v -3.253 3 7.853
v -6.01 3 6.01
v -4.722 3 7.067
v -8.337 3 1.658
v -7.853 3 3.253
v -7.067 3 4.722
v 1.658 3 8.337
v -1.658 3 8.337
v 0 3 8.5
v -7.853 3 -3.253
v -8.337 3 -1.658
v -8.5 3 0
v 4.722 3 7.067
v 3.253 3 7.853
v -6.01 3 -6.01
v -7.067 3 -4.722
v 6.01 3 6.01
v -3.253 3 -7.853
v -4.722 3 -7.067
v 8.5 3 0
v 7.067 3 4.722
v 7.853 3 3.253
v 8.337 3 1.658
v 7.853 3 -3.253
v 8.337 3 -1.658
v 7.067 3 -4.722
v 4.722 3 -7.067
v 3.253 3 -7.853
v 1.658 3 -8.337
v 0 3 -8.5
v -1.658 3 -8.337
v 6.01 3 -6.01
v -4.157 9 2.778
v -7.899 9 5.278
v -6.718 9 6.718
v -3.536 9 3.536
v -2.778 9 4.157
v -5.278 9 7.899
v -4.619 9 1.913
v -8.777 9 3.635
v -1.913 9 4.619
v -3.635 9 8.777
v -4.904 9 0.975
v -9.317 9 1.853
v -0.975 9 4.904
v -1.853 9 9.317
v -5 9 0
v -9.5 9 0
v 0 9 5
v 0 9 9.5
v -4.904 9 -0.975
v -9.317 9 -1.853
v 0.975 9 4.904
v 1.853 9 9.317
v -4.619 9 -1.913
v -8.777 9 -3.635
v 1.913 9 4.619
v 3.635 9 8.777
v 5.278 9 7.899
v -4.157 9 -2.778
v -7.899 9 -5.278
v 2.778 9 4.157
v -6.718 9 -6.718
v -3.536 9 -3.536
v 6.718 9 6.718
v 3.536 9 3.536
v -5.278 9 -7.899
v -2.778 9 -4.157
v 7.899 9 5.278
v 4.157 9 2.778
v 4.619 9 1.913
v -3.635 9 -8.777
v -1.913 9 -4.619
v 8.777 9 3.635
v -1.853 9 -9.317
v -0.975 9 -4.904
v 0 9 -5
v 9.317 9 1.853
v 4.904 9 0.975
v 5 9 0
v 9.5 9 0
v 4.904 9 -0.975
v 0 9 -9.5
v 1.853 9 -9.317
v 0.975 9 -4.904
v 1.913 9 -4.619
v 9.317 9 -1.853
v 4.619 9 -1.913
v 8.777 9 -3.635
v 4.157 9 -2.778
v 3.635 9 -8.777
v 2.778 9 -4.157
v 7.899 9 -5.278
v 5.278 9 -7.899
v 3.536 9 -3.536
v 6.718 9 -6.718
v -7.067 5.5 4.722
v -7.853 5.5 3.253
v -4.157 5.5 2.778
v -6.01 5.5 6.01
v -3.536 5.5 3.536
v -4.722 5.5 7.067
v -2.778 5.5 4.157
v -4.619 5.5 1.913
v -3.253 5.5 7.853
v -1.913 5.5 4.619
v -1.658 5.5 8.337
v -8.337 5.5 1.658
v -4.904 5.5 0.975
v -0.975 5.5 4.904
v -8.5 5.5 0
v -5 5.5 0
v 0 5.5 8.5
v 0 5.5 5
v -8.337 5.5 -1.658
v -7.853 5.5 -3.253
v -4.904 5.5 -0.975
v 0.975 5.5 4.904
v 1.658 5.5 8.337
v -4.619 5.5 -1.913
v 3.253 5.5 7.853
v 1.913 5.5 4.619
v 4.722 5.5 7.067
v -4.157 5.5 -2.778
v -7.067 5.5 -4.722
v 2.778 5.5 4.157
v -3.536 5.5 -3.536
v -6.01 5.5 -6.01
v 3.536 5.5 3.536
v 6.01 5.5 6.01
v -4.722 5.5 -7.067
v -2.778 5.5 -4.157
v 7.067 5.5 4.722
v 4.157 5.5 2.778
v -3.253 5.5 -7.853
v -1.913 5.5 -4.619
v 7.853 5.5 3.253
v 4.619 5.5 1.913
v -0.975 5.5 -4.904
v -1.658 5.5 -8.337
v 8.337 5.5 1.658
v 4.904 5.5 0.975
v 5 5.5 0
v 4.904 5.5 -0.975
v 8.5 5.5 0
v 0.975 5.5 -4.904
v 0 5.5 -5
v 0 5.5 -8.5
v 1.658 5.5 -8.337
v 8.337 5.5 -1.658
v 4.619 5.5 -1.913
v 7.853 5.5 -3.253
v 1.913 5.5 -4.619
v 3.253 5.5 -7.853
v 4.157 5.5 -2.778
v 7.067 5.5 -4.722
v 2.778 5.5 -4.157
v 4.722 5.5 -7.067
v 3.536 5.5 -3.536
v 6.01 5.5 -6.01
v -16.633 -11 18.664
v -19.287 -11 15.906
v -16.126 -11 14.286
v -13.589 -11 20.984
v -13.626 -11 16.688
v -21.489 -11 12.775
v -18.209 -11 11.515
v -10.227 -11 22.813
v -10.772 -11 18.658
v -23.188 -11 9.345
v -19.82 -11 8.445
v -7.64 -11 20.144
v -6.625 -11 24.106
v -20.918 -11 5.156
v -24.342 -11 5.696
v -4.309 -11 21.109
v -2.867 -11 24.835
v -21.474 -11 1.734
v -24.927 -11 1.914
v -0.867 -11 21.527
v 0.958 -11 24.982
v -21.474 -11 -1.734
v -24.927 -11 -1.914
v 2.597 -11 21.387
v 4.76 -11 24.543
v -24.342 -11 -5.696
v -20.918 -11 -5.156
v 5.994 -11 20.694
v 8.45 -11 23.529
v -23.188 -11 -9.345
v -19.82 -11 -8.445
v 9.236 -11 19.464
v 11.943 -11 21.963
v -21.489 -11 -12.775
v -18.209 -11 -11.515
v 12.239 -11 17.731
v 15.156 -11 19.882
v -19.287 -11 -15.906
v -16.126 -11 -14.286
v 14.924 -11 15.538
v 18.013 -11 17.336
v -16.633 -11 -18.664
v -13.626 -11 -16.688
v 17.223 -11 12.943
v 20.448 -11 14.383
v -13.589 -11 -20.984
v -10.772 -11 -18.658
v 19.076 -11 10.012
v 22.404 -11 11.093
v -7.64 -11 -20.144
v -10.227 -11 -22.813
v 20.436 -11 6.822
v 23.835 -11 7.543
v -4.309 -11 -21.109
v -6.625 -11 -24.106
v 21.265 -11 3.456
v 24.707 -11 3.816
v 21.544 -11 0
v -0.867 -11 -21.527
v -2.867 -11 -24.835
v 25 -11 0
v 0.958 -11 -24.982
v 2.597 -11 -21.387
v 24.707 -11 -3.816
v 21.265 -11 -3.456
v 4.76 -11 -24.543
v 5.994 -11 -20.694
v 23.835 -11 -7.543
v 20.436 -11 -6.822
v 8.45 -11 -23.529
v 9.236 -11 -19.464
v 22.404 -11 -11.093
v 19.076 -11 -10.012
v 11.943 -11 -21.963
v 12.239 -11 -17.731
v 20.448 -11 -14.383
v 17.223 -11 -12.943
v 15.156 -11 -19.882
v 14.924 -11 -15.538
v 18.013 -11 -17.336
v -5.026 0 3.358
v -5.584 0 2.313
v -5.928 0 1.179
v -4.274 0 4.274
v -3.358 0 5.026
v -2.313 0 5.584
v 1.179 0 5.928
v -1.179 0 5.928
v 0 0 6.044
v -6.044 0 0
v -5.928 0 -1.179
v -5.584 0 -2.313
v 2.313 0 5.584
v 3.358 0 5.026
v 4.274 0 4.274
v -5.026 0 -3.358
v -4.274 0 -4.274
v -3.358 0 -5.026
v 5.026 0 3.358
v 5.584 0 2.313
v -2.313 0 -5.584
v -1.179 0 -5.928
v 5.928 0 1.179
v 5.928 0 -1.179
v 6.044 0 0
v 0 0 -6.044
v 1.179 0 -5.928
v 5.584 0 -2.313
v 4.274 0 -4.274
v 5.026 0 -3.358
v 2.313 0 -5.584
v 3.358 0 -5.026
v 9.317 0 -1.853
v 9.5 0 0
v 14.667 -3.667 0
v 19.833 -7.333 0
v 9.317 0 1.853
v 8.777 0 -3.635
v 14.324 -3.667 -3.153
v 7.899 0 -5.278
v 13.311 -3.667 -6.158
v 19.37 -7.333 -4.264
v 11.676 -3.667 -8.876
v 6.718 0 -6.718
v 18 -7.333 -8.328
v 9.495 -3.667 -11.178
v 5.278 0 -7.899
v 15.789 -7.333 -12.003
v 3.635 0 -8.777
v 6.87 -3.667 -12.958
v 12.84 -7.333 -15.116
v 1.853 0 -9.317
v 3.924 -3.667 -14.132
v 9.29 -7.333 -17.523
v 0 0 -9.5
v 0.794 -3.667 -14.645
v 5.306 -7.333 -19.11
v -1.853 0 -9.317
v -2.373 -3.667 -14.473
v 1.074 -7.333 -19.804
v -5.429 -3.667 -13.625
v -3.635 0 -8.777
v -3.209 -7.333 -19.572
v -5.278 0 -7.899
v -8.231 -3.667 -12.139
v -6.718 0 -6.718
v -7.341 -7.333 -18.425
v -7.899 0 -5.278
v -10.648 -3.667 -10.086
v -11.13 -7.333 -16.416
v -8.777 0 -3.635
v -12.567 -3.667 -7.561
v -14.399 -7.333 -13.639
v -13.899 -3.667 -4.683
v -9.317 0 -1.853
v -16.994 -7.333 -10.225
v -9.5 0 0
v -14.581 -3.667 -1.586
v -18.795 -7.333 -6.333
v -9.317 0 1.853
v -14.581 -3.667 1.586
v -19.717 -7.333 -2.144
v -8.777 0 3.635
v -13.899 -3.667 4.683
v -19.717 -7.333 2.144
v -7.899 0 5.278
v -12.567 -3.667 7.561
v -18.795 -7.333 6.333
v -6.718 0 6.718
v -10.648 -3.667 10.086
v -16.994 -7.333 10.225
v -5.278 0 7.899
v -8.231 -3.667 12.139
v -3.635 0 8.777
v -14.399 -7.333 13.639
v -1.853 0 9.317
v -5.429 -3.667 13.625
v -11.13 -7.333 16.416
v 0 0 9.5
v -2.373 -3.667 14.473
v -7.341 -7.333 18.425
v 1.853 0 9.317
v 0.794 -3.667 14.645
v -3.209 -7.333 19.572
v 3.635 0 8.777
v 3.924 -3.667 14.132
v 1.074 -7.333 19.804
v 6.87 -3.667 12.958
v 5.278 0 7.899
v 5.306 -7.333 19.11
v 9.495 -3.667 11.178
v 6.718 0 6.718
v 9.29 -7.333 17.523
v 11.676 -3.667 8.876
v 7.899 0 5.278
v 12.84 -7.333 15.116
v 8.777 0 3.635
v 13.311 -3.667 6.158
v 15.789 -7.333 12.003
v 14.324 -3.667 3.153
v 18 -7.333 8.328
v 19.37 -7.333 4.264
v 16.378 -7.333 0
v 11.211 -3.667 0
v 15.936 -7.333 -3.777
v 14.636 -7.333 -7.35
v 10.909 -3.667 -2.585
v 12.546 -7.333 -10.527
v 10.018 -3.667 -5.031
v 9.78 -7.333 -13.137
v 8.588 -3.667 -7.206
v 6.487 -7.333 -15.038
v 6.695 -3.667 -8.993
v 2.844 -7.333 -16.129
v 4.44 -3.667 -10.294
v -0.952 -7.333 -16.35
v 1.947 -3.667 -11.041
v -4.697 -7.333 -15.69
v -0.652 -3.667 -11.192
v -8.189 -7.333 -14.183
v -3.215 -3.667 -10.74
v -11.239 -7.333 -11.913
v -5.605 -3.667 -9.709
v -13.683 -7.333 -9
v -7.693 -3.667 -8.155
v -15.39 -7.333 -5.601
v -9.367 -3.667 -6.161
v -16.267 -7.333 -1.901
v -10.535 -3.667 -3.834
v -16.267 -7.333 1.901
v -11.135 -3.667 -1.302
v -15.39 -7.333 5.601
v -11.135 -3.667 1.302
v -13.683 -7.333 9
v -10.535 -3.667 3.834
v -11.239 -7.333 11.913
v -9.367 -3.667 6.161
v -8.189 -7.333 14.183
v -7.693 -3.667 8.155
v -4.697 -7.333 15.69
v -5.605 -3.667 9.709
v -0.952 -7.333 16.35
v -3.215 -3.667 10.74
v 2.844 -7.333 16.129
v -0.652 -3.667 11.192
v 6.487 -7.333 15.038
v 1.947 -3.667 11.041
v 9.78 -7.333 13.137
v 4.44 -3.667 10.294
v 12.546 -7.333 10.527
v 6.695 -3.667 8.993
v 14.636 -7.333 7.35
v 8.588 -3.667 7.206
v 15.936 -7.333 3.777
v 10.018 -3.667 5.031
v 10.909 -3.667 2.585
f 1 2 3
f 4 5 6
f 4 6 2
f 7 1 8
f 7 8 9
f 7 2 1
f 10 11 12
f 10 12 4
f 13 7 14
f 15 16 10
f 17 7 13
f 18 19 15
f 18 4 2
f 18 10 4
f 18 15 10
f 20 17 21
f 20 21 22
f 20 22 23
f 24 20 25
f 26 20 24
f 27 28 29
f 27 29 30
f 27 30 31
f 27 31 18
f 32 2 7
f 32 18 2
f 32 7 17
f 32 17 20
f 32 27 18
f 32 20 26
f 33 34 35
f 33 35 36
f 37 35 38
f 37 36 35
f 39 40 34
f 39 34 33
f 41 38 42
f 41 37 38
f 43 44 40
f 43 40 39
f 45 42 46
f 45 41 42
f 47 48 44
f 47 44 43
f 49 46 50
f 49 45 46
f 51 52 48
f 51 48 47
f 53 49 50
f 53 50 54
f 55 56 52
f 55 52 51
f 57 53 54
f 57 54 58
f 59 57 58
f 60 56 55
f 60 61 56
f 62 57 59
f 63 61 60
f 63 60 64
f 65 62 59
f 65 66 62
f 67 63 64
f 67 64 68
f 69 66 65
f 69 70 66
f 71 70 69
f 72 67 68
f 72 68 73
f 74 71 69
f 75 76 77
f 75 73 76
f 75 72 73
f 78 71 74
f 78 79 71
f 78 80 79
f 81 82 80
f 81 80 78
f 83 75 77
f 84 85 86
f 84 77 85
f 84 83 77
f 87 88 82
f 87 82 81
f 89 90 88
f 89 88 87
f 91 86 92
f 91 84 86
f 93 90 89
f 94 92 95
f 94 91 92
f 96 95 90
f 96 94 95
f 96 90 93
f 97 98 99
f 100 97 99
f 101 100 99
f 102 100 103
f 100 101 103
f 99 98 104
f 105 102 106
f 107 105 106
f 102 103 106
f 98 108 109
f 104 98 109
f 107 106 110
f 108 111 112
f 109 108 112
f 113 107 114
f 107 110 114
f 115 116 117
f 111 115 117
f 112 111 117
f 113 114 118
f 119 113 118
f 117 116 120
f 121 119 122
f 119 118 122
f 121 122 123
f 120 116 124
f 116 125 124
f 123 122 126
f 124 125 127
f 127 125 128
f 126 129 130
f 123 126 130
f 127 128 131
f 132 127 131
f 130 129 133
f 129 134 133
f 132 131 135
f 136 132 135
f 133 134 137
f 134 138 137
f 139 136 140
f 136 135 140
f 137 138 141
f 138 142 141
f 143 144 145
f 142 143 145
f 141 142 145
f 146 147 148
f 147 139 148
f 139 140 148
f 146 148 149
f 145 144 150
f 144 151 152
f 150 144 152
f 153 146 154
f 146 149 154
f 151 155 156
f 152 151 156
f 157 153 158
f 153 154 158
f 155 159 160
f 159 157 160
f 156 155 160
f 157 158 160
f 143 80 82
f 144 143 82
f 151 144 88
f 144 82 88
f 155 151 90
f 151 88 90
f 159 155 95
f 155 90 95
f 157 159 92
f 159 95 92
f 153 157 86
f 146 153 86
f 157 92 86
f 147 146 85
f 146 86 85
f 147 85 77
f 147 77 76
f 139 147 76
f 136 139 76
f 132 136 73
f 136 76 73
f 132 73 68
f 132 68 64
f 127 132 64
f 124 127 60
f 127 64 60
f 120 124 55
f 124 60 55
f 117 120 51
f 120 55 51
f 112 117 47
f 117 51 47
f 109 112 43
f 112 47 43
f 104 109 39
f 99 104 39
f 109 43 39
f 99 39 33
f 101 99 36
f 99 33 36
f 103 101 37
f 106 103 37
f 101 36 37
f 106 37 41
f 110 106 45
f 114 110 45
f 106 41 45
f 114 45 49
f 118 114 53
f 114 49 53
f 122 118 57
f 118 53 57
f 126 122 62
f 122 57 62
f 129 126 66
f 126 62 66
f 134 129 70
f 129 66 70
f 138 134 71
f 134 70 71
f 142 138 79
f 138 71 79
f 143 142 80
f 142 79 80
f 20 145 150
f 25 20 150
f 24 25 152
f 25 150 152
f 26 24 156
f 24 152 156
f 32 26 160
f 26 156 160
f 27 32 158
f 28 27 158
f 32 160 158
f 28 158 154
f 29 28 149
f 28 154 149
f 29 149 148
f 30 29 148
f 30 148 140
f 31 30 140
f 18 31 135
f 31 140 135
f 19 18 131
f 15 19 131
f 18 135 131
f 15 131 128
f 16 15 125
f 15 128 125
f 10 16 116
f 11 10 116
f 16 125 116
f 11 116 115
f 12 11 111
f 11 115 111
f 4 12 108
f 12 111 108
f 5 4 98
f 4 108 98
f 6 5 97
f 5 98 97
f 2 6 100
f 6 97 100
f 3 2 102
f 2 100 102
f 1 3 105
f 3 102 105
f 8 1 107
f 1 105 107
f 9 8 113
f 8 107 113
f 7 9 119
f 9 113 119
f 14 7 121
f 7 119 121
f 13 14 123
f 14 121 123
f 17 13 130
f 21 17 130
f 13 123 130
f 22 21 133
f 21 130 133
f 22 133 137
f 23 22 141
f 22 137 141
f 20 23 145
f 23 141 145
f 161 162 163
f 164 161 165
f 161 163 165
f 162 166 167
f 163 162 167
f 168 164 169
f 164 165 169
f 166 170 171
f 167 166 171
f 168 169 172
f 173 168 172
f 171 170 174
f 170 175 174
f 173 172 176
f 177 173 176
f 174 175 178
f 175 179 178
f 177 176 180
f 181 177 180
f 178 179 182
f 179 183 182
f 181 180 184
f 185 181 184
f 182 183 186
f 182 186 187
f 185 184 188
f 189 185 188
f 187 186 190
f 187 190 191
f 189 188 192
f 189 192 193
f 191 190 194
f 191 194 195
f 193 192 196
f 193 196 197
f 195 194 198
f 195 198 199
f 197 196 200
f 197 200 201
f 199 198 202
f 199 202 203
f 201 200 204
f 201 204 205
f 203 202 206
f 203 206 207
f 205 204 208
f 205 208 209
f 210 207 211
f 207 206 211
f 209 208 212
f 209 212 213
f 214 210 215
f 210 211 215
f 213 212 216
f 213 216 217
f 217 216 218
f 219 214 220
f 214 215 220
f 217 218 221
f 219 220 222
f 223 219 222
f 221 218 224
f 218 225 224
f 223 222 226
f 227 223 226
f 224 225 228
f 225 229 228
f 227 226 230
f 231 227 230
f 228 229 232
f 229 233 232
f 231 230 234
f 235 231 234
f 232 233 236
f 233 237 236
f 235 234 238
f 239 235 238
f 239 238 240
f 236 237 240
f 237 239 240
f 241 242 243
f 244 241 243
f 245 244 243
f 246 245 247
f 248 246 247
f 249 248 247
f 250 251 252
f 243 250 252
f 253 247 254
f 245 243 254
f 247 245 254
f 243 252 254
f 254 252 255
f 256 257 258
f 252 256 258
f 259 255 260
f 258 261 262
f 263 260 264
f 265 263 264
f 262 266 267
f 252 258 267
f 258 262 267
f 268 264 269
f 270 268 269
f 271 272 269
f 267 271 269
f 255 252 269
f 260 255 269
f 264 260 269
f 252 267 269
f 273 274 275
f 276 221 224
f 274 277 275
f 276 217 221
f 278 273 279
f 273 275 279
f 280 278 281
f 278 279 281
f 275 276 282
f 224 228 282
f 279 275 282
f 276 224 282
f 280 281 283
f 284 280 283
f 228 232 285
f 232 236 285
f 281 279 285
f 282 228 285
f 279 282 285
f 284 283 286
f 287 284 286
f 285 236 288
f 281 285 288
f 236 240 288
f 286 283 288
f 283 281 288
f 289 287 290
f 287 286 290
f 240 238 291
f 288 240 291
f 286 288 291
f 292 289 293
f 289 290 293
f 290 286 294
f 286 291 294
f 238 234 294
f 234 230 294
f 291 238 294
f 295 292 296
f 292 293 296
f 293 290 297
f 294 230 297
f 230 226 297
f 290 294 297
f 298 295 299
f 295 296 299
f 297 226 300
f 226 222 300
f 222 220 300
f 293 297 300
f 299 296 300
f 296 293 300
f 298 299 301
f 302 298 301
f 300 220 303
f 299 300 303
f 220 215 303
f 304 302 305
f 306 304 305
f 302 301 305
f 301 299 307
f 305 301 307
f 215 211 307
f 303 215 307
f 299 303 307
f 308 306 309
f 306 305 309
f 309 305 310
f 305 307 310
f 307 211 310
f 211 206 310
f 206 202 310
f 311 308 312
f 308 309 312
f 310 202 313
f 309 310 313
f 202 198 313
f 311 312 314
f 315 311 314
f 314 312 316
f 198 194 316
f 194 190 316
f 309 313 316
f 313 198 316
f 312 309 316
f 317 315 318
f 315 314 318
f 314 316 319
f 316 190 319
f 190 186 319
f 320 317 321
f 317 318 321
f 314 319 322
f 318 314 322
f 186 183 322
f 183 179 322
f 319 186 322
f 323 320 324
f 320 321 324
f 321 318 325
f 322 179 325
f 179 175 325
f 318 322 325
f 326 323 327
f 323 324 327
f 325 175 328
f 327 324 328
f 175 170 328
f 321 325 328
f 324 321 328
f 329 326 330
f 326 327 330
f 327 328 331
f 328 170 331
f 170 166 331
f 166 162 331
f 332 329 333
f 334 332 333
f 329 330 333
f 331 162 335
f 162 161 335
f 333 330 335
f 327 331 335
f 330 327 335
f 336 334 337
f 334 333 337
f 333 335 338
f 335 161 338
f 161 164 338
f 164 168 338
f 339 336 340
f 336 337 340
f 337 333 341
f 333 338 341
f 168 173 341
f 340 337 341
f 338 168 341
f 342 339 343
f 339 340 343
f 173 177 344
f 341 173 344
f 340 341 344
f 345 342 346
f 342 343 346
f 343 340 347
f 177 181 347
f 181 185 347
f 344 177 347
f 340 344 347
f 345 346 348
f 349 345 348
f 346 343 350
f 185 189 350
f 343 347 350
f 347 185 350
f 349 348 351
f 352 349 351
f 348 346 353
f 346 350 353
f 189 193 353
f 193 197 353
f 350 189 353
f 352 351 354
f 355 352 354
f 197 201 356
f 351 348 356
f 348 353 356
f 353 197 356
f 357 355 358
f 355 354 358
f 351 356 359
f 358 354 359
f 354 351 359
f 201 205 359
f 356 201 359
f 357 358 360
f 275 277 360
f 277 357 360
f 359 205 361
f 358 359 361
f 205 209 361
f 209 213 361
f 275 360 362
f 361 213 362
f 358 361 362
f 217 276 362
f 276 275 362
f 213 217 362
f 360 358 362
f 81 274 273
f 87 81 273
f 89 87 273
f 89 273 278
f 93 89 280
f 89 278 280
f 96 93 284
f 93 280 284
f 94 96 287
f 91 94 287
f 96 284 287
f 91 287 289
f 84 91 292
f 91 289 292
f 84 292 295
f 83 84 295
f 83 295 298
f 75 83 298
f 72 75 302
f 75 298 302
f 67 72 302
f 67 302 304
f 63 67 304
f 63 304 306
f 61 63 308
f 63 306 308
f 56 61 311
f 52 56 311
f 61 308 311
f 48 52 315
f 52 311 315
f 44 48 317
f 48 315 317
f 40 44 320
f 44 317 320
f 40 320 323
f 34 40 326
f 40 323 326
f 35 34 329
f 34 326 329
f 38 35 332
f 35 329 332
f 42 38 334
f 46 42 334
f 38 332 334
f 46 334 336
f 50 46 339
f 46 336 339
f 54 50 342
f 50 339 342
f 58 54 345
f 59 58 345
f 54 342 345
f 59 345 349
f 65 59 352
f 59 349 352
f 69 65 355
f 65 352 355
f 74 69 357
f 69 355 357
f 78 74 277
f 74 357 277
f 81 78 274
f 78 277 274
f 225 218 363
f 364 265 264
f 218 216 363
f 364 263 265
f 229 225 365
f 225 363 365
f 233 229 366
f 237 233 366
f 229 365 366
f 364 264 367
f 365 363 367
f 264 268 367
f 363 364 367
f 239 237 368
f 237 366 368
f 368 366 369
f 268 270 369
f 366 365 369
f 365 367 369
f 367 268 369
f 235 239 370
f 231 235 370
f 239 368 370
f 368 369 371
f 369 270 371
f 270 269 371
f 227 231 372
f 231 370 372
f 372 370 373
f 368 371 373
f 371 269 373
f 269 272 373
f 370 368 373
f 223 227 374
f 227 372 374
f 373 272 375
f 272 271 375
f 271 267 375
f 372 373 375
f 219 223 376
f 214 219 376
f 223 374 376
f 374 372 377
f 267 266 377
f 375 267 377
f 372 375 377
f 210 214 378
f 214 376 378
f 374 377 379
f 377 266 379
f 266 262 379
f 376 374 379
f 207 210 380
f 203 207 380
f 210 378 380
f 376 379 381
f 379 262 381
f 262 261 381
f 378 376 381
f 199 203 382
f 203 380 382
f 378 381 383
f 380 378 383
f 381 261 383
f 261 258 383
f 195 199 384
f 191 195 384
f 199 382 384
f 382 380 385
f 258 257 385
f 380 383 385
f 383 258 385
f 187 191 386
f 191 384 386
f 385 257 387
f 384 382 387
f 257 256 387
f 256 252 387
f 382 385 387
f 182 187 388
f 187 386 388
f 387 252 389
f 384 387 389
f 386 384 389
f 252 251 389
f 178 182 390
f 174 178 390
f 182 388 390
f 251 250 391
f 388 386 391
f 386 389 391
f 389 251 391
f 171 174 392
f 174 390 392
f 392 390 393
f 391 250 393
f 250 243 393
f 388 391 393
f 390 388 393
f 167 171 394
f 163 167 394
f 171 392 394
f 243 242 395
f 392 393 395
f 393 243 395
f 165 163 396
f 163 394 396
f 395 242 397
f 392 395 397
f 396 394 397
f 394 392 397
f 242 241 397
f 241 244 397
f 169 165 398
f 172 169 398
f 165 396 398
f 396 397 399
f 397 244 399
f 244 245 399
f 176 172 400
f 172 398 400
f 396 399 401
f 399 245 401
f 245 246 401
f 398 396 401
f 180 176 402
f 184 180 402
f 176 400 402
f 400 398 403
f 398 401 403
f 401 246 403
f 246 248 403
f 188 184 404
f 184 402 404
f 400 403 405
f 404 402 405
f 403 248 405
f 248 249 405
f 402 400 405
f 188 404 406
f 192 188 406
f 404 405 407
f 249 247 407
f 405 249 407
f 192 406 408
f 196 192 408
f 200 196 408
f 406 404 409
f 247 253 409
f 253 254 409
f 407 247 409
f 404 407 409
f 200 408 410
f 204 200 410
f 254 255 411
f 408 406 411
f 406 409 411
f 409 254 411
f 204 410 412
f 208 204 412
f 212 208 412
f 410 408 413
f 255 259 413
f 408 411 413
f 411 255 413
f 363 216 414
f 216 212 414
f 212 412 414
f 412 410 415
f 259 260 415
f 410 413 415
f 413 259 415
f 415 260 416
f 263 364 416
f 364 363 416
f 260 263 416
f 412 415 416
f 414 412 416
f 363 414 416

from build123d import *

# Parameters (mm, degrees)
SKETCH_4_R          = 9.5
EXTRUDE_1_DEPTH     = 9
SKETCH_5_R          = 5
CUT_EXTRUDE_1_DEPTH = 3.5
SKETCH_6_R          = 8.5
CUT_EXTRUDE_2_DEPTH = 2.5


with BuildPart() as part:
    # 草图4 → 凸台-拉伸1 (new body)
    with BuildSketch(Plane(origin=(0, 0, 0), x_dir=(1, 0, 0), z_dir=(0, 1, 0))):
        Circle(SKETCH_4_R)
    extrude(amount=EXTRUDE_1_DEPTH)

    # 草图5 → 切除-拉伸1 (cut)
    with BuildSketch(Plane(origin=(0, 9, 0), x_dir=(1, 0, 0), z_dir=(0, 1, 0))):
        Circle(SKETCH_5_R)
    extrude(amount=-CUT_EXTRUDE_1_DEPTH, mode=Mode.SUBTRACT)

    # 草图6 → 切除-拉伸2 (cut)
    with BuildSketch(Plane(origin=(0, 5.5, 0), x_dir=(1, 0, 0), z_dir=(0, 1, 0))):
        Circle(SKETCH_6_R)
    extrude(amount=-CUT_EXTRUDE_2_DEPTH, mode=Mode.SUBTRACT)

    # 草图8 → 旋转3 (revolve)
    with BuildSketch(Plane.XY):
        Polygon((9.5, 0), (25, -11), (21.54425858, -11), (6.04425858, 0), align=None)
    revolve(axis=Axis((0, 0, 0), (0, 1, 0)))


solid = part.part
